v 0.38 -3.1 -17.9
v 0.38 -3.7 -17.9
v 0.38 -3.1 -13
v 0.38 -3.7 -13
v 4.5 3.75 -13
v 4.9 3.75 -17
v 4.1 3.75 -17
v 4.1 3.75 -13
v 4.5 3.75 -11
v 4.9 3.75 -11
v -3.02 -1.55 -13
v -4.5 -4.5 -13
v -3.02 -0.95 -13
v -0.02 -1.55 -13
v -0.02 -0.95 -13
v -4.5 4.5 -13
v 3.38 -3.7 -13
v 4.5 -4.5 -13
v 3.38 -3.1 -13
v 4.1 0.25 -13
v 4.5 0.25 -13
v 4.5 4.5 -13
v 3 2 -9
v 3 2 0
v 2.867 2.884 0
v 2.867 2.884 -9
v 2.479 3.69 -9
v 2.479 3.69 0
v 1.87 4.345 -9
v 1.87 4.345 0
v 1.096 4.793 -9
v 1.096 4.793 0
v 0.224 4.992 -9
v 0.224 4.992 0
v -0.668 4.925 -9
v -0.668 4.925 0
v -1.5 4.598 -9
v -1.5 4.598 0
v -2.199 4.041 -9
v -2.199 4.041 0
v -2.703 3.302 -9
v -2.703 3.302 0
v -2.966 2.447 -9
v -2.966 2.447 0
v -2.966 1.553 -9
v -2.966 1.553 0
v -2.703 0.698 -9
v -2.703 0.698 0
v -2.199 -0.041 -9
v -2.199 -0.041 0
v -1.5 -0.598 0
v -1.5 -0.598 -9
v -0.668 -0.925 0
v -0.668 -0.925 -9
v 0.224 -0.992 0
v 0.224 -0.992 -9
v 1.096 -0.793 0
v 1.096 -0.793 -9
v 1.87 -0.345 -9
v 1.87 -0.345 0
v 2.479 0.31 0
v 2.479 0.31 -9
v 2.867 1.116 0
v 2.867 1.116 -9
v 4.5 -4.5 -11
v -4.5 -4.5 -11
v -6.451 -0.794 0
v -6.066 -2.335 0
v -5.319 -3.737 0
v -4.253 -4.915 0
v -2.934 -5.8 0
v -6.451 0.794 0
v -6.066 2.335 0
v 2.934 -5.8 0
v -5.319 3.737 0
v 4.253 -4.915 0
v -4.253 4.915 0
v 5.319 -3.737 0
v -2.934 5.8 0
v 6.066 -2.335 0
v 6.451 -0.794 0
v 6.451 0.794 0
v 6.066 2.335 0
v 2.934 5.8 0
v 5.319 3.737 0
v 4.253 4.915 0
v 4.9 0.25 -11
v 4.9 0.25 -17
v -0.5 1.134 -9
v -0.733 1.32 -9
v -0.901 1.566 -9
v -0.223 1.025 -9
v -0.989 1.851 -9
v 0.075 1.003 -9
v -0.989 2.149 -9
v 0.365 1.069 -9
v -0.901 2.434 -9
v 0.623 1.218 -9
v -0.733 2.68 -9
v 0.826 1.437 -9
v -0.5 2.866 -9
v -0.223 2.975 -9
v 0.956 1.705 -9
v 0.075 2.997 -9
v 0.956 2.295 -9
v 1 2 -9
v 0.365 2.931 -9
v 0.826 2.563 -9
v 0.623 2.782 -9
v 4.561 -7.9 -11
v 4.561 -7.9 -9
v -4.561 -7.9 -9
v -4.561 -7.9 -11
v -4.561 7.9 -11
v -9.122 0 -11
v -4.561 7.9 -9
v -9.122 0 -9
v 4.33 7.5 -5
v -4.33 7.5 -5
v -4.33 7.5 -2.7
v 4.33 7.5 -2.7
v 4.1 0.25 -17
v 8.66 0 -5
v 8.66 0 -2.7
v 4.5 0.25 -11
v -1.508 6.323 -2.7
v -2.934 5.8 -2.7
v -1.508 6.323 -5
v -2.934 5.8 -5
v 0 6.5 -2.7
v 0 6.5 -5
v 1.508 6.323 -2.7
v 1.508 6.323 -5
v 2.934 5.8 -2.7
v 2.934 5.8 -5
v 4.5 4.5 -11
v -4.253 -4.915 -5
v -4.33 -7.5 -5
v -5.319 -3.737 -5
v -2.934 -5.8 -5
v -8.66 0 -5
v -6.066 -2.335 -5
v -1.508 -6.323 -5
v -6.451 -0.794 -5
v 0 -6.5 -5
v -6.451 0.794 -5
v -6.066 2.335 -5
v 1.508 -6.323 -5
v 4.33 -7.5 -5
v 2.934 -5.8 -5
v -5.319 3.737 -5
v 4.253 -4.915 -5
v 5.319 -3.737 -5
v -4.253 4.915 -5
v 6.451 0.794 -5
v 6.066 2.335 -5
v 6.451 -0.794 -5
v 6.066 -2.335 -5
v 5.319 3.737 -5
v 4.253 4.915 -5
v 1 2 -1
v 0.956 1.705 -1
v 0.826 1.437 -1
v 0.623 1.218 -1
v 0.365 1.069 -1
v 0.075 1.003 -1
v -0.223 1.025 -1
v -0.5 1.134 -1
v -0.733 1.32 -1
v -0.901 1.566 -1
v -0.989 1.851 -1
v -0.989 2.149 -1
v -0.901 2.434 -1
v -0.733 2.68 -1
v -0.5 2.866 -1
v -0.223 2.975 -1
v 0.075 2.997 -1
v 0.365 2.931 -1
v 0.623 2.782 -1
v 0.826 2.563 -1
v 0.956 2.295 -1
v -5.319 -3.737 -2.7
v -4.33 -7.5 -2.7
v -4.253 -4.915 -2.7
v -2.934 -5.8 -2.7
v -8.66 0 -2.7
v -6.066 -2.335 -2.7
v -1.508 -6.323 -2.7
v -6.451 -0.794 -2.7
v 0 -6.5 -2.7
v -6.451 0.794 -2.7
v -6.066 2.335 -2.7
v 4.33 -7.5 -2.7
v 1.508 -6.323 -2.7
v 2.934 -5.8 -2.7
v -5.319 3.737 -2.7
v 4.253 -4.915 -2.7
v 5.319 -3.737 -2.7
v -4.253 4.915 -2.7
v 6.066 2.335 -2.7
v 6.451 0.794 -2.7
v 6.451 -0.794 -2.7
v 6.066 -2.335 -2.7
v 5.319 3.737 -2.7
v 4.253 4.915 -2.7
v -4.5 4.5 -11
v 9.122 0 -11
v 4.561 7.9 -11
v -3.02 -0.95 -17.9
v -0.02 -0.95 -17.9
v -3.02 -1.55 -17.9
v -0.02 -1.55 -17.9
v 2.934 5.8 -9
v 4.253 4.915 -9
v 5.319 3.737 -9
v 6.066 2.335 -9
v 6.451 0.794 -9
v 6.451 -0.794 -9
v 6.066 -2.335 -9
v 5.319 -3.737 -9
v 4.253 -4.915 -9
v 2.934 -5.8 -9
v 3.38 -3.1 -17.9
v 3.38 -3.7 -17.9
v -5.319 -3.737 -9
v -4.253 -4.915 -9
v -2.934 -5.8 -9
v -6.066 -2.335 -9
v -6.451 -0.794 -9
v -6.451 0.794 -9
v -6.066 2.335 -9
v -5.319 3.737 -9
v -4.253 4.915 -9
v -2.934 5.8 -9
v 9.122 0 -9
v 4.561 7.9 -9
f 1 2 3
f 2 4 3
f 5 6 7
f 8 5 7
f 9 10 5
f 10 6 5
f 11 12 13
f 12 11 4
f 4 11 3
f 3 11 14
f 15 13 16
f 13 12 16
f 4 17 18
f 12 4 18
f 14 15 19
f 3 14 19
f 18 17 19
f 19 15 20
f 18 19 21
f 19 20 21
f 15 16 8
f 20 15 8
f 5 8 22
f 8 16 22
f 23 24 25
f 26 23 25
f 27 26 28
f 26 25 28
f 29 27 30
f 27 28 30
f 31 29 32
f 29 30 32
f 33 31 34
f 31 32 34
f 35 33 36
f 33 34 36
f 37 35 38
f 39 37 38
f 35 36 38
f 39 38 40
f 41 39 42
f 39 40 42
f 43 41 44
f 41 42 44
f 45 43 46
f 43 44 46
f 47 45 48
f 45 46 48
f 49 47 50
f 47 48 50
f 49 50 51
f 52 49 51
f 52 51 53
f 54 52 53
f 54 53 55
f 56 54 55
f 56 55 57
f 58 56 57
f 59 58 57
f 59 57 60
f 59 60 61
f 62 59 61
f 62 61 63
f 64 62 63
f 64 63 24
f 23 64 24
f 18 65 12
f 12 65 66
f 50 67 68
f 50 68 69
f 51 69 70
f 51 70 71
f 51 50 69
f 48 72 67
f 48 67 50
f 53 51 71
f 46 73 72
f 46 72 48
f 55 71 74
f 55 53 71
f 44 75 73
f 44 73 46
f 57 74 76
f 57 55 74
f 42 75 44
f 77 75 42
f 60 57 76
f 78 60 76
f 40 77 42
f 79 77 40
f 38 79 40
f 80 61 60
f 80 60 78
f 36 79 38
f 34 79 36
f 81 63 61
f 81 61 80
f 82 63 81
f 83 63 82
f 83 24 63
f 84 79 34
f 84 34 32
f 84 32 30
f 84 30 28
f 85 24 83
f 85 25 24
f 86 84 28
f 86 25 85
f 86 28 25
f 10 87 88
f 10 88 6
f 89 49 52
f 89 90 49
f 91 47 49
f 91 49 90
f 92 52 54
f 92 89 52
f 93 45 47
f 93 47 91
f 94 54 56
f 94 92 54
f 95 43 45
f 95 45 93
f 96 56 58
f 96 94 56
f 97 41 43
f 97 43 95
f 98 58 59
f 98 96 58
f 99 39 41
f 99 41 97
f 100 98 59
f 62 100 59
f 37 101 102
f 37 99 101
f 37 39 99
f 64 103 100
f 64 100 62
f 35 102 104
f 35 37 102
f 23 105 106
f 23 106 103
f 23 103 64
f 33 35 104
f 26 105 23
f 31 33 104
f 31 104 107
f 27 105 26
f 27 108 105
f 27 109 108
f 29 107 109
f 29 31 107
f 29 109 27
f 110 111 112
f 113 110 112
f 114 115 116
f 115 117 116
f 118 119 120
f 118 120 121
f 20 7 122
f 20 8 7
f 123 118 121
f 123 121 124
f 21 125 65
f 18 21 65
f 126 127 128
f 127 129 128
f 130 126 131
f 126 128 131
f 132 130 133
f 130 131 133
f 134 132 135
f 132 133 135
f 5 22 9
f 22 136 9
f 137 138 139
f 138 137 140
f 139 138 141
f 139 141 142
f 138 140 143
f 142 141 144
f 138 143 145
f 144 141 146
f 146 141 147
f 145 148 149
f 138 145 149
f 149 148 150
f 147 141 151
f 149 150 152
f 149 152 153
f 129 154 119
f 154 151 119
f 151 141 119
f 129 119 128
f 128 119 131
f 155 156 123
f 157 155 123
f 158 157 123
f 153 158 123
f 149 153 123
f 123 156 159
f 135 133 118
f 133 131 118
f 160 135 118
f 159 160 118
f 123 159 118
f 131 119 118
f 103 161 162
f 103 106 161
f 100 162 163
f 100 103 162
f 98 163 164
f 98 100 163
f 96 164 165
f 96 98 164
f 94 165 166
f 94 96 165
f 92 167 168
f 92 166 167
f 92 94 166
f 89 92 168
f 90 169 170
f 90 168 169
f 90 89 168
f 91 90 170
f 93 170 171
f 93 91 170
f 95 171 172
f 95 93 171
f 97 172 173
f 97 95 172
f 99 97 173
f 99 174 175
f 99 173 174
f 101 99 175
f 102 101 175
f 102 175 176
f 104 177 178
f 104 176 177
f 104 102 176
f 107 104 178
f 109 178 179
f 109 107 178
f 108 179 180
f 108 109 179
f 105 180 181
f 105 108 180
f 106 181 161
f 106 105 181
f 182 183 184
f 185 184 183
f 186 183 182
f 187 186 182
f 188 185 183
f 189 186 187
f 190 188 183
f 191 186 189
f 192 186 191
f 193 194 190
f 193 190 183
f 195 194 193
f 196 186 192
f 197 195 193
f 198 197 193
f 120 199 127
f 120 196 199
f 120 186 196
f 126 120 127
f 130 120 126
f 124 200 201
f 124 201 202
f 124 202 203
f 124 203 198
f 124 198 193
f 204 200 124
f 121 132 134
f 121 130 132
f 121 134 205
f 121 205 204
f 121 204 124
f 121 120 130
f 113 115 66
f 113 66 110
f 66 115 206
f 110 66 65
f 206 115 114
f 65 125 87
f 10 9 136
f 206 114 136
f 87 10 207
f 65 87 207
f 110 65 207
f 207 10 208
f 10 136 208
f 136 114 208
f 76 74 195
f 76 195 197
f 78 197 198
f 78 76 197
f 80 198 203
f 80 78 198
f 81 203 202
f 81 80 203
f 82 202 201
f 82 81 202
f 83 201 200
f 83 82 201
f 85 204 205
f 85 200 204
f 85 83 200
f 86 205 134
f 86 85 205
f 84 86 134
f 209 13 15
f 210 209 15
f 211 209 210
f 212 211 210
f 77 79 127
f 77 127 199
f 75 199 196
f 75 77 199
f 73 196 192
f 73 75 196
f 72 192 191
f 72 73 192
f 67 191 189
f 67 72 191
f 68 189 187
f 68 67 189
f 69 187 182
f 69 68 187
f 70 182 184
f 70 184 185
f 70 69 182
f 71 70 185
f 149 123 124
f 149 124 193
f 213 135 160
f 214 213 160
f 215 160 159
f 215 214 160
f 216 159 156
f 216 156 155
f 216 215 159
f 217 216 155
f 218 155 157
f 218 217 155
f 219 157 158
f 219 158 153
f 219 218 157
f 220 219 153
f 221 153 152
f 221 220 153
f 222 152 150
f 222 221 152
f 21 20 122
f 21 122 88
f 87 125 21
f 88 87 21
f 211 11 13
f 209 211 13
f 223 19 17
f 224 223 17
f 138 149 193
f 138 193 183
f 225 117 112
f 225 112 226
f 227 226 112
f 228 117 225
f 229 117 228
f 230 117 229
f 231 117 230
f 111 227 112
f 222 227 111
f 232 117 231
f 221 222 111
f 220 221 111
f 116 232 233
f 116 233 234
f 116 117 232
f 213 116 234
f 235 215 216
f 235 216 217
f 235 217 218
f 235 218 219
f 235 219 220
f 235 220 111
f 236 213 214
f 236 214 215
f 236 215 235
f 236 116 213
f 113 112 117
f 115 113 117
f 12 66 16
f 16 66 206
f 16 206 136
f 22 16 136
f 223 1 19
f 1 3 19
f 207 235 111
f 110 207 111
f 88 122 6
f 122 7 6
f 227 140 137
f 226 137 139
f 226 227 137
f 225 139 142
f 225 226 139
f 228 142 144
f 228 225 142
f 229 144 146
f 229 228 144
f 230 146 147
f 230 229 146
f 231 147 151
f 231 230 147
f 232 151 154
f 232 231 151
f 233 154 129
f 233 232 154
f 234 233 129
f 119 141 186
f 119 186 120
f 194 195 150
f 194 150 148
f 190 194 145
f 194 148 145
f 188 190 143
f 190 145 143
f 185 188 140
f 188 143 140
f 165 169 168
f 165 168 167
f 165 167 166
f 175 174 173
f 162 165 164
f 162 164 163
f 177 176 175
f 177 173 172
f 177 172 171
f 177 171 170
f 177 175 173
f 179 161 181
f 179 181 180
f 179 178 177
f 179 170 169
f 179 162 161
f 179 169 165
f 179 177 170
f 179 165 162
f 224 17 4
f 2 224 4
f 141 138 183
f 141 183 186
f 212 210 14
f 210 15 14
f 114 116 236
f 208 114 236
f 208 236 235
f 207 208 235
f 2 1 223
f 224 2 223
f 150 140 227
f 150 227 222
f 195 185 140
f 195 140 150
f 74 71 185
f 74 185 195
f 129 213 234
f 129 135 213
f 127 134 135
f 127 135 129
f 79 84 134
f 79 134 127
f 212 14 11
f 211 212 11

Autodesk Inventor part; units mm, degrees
ref_plane "YZ Plane" through (0, 0, 0) normal (1, 0, 0) x (0, 1, 0)
ref_plane "XZ Plane" through (0, 0, 0) normal (0, 1, 0) x (-1, 0, 0)
ref_plane "XY Plane" through (0, 0, 0) normal (0, 0, 1) x (1, 0, 0)
sketch "Sketch1" plane through (0, 0, 0) normal (0, 0, 1) x (1, 0, 0)
  line L0 (4.5611, 7.9) -> (9.1221, 0)
  line L1 (9.1221, 0) -> (4.5611, -7.9)
  line L2 (4.5611, -7.9) -> (-4.5611, -7.9)
  line L3 (-4.5611, -7.9) -> (-9.1221, 0)
  line L4 (-9.1221, 0) -> (-4.5611, 7.9)
  line L5 (-4.5611, 7.9) -> (4.5611, 7.9)
  circle A0 centre (0, 2) radius 1
  circle A1 centre (0, 2) radius 3
  line L6 (4.3301, 7.5) -> (8.6603, 0)
  line L7 (8.6603, 0) -> (4.3301, -7.5)
  line L8 (4.3301, -7.5) -> (-4.3301, -7.5)
  line L9 (-4.3301, -7.5) -> (-8.6603, 0)
  line L10 (-8.6603, 0) -> (-4.3301, 7.5)
  line L11 (-4.3301, 7.5) -> (4.3301, 7.5)
  line L12 (4.1, 3.75) -> (4.1, 0.25)
  line L13 (4.1, 0.25) -> (4.9, 0.25)
  line L14 (4.9, 0.25) -> (4.9, 3.75)
  line L15 (4.9, 3.75) -> (4.1, 3.75)
  line L16 (0.38, -3.1) -> (3.38, -3.1)
  line L17 (3.38, -3.1) -> (3.38, -3.7)
  line L18 (3.38, -3.7) -> (0.38, -3.7)
  line L19 (0.38, -3.7) -> (0.38, -3.1)
  line L20 (-3.02, -0.95) -> (-0.02, -0.95)
  line L21 (-0.02, -0.95) -> (-0.02, -1.55)
  line L22 (-0.02, -1.55) -> (-3.02, -1.55)
  line L23 (-3.02, -1.55) -> (-3.02, -0.95)
  line L24 (-4.5, 4.5) -> (4.5, 4.5)
  line L25 (4.5, 4.5) -> (4.5, -4.5)
  line L26 (4.5, -4.5) -> (-4.5, -4.5)
  line L27 (-4.5, -4.5) -> (-4.5, 4.5)
  circle A2 centre (0, 0) radius 6.5
  line L28 (-5.8, -5.8) -> (5.8, -5.8)
  line L29 (5.8, -5.8) -> (5.8, 5.8)
  line L30 (5.8, 5.8) -> (-5.8, 5.8)
  line L31 (-5.8, 5.8) -> (-5.8, -5.8)
  point P0 (-2.9343, -5.8)
  point P1 (2.9343, -5.8)
  point P2 (2.9343, 5.8)
  point P3 (-2.9343, 5.8)
  point P4 (5.8, -5.7541)
  point P5 (5.8, 5.7541)
  point P6 (5.7735, 5.8)
  point P7 (-5.7735, 5.8)
  point P8 (-5.8, 5.7541)
  point P9 (-5.8, -5.7541)
  point P10 (-5.7735, -5.8)
  point P11 (5.7735, -5.8)
extrude "Extrusion4" add sketch "Sketch1" against normal blind 9 contours A2 L29 L28 L31 L30 | A2 L29 | L31 A2 | A1 L24 L25 L15 L12 L13 L26 L27 L20 L23 L22 L21 | L21 L22 L23 L20 A1 | L25 L13 L12 L15 | L15 L14 L13 L25 | L16 L17 L18 L19
extrude "Extrusion5" add sketch "Sketch1" against normal blind 2 from surface at -9 contours L0 L30 L6 L11 L10 L4 L5 | L0 L29 L6 L30 | L0 L1 L29 L7 L6 | L30 A2 L10 L11 L6 | L6 L29 A2 L30 | L30 L10 L31 L4 | L6 L7 L29 A2 | L30 A2 | A2 L29 L28 L31 L30 | L31 L10 L9 L3 L4 | L30 A2 L31 L10 | L1 L28 L7 L29 | A2 L29 | L31 A2 L9 L10 | L1 L2 L3 L28 L9 L8 L7 | L7 L28 A2 L29 | L31 A2 | L31 L9 L28 L3 | L7 L8 L9 L28 A2 | A2 L28 | A2 L28 L9 L31 | A0 | A1 L21 L20 L24 | A1 L24 L25 L15 L12 L13 L26 L27 L20 L23 L22 L21 | L24 A1 | L21 L22 L23 L20 A1 | A1 L20 L21 | L25 L13 L12 L15 | L15 L14 L13 L25 | L16 L17 L18 L19
extrude "Extrusion6" add sketch "Sketch1" against normal blind 2 from surface at -11 contours A0 | A1 L21 L20 L24 | A1 L24 L25 L15 L12 L13 L26 L27 L20 L23 L22 L21 | L21 L22 L23 L20 A1 | A1 L20 L21 | L25 L13 L12 L15 | L16 L17 L18 L19
extrude "Extrusion7" add sketch "Sketch1" against normal blind 4.9 from surface at -13 contours L21 L22 L23 L20 A1 | A1 L20 L21 | L16 L17 L18 L19
extrude "Extrusion8" add sketch "Sketch1" against normal blind 6 from surface at -11 contours L25 L13 L12 L15 | L15 L14 L13 L25
extrude "Extrusion9" add sketch "Sketch1" along normal blind 6.3 from surface at -9 contours L30 A2 L10 L11 L6 | L6 L29 A2 L30 | L6 L7 L29 A2 | L30 A2 L31 L10 | L31 A2 L9 L10 | L7 L28 A2 L29 | L7 L8 L9 L28 A2 | A2 L28 L9 L31
extrude "Extrusion10" cut sketch "Sketch1" along normal blind 4 from surface at -9 contours L30 A2 L10 L11 L6 | L6 L29 A2 L30 | L6 L7 L29 A2 | L30 A2 L31 L10 | L31 A2 L9 L10 | L7 L28 A2 L29 | L7 L8 L9 L28 A2 | A2 L28 L9 L31
extrude "Extrusion11" add sketch "Sketch1" along normal blind 8 from surface at -9 contours A0
properties part number "Jack"
